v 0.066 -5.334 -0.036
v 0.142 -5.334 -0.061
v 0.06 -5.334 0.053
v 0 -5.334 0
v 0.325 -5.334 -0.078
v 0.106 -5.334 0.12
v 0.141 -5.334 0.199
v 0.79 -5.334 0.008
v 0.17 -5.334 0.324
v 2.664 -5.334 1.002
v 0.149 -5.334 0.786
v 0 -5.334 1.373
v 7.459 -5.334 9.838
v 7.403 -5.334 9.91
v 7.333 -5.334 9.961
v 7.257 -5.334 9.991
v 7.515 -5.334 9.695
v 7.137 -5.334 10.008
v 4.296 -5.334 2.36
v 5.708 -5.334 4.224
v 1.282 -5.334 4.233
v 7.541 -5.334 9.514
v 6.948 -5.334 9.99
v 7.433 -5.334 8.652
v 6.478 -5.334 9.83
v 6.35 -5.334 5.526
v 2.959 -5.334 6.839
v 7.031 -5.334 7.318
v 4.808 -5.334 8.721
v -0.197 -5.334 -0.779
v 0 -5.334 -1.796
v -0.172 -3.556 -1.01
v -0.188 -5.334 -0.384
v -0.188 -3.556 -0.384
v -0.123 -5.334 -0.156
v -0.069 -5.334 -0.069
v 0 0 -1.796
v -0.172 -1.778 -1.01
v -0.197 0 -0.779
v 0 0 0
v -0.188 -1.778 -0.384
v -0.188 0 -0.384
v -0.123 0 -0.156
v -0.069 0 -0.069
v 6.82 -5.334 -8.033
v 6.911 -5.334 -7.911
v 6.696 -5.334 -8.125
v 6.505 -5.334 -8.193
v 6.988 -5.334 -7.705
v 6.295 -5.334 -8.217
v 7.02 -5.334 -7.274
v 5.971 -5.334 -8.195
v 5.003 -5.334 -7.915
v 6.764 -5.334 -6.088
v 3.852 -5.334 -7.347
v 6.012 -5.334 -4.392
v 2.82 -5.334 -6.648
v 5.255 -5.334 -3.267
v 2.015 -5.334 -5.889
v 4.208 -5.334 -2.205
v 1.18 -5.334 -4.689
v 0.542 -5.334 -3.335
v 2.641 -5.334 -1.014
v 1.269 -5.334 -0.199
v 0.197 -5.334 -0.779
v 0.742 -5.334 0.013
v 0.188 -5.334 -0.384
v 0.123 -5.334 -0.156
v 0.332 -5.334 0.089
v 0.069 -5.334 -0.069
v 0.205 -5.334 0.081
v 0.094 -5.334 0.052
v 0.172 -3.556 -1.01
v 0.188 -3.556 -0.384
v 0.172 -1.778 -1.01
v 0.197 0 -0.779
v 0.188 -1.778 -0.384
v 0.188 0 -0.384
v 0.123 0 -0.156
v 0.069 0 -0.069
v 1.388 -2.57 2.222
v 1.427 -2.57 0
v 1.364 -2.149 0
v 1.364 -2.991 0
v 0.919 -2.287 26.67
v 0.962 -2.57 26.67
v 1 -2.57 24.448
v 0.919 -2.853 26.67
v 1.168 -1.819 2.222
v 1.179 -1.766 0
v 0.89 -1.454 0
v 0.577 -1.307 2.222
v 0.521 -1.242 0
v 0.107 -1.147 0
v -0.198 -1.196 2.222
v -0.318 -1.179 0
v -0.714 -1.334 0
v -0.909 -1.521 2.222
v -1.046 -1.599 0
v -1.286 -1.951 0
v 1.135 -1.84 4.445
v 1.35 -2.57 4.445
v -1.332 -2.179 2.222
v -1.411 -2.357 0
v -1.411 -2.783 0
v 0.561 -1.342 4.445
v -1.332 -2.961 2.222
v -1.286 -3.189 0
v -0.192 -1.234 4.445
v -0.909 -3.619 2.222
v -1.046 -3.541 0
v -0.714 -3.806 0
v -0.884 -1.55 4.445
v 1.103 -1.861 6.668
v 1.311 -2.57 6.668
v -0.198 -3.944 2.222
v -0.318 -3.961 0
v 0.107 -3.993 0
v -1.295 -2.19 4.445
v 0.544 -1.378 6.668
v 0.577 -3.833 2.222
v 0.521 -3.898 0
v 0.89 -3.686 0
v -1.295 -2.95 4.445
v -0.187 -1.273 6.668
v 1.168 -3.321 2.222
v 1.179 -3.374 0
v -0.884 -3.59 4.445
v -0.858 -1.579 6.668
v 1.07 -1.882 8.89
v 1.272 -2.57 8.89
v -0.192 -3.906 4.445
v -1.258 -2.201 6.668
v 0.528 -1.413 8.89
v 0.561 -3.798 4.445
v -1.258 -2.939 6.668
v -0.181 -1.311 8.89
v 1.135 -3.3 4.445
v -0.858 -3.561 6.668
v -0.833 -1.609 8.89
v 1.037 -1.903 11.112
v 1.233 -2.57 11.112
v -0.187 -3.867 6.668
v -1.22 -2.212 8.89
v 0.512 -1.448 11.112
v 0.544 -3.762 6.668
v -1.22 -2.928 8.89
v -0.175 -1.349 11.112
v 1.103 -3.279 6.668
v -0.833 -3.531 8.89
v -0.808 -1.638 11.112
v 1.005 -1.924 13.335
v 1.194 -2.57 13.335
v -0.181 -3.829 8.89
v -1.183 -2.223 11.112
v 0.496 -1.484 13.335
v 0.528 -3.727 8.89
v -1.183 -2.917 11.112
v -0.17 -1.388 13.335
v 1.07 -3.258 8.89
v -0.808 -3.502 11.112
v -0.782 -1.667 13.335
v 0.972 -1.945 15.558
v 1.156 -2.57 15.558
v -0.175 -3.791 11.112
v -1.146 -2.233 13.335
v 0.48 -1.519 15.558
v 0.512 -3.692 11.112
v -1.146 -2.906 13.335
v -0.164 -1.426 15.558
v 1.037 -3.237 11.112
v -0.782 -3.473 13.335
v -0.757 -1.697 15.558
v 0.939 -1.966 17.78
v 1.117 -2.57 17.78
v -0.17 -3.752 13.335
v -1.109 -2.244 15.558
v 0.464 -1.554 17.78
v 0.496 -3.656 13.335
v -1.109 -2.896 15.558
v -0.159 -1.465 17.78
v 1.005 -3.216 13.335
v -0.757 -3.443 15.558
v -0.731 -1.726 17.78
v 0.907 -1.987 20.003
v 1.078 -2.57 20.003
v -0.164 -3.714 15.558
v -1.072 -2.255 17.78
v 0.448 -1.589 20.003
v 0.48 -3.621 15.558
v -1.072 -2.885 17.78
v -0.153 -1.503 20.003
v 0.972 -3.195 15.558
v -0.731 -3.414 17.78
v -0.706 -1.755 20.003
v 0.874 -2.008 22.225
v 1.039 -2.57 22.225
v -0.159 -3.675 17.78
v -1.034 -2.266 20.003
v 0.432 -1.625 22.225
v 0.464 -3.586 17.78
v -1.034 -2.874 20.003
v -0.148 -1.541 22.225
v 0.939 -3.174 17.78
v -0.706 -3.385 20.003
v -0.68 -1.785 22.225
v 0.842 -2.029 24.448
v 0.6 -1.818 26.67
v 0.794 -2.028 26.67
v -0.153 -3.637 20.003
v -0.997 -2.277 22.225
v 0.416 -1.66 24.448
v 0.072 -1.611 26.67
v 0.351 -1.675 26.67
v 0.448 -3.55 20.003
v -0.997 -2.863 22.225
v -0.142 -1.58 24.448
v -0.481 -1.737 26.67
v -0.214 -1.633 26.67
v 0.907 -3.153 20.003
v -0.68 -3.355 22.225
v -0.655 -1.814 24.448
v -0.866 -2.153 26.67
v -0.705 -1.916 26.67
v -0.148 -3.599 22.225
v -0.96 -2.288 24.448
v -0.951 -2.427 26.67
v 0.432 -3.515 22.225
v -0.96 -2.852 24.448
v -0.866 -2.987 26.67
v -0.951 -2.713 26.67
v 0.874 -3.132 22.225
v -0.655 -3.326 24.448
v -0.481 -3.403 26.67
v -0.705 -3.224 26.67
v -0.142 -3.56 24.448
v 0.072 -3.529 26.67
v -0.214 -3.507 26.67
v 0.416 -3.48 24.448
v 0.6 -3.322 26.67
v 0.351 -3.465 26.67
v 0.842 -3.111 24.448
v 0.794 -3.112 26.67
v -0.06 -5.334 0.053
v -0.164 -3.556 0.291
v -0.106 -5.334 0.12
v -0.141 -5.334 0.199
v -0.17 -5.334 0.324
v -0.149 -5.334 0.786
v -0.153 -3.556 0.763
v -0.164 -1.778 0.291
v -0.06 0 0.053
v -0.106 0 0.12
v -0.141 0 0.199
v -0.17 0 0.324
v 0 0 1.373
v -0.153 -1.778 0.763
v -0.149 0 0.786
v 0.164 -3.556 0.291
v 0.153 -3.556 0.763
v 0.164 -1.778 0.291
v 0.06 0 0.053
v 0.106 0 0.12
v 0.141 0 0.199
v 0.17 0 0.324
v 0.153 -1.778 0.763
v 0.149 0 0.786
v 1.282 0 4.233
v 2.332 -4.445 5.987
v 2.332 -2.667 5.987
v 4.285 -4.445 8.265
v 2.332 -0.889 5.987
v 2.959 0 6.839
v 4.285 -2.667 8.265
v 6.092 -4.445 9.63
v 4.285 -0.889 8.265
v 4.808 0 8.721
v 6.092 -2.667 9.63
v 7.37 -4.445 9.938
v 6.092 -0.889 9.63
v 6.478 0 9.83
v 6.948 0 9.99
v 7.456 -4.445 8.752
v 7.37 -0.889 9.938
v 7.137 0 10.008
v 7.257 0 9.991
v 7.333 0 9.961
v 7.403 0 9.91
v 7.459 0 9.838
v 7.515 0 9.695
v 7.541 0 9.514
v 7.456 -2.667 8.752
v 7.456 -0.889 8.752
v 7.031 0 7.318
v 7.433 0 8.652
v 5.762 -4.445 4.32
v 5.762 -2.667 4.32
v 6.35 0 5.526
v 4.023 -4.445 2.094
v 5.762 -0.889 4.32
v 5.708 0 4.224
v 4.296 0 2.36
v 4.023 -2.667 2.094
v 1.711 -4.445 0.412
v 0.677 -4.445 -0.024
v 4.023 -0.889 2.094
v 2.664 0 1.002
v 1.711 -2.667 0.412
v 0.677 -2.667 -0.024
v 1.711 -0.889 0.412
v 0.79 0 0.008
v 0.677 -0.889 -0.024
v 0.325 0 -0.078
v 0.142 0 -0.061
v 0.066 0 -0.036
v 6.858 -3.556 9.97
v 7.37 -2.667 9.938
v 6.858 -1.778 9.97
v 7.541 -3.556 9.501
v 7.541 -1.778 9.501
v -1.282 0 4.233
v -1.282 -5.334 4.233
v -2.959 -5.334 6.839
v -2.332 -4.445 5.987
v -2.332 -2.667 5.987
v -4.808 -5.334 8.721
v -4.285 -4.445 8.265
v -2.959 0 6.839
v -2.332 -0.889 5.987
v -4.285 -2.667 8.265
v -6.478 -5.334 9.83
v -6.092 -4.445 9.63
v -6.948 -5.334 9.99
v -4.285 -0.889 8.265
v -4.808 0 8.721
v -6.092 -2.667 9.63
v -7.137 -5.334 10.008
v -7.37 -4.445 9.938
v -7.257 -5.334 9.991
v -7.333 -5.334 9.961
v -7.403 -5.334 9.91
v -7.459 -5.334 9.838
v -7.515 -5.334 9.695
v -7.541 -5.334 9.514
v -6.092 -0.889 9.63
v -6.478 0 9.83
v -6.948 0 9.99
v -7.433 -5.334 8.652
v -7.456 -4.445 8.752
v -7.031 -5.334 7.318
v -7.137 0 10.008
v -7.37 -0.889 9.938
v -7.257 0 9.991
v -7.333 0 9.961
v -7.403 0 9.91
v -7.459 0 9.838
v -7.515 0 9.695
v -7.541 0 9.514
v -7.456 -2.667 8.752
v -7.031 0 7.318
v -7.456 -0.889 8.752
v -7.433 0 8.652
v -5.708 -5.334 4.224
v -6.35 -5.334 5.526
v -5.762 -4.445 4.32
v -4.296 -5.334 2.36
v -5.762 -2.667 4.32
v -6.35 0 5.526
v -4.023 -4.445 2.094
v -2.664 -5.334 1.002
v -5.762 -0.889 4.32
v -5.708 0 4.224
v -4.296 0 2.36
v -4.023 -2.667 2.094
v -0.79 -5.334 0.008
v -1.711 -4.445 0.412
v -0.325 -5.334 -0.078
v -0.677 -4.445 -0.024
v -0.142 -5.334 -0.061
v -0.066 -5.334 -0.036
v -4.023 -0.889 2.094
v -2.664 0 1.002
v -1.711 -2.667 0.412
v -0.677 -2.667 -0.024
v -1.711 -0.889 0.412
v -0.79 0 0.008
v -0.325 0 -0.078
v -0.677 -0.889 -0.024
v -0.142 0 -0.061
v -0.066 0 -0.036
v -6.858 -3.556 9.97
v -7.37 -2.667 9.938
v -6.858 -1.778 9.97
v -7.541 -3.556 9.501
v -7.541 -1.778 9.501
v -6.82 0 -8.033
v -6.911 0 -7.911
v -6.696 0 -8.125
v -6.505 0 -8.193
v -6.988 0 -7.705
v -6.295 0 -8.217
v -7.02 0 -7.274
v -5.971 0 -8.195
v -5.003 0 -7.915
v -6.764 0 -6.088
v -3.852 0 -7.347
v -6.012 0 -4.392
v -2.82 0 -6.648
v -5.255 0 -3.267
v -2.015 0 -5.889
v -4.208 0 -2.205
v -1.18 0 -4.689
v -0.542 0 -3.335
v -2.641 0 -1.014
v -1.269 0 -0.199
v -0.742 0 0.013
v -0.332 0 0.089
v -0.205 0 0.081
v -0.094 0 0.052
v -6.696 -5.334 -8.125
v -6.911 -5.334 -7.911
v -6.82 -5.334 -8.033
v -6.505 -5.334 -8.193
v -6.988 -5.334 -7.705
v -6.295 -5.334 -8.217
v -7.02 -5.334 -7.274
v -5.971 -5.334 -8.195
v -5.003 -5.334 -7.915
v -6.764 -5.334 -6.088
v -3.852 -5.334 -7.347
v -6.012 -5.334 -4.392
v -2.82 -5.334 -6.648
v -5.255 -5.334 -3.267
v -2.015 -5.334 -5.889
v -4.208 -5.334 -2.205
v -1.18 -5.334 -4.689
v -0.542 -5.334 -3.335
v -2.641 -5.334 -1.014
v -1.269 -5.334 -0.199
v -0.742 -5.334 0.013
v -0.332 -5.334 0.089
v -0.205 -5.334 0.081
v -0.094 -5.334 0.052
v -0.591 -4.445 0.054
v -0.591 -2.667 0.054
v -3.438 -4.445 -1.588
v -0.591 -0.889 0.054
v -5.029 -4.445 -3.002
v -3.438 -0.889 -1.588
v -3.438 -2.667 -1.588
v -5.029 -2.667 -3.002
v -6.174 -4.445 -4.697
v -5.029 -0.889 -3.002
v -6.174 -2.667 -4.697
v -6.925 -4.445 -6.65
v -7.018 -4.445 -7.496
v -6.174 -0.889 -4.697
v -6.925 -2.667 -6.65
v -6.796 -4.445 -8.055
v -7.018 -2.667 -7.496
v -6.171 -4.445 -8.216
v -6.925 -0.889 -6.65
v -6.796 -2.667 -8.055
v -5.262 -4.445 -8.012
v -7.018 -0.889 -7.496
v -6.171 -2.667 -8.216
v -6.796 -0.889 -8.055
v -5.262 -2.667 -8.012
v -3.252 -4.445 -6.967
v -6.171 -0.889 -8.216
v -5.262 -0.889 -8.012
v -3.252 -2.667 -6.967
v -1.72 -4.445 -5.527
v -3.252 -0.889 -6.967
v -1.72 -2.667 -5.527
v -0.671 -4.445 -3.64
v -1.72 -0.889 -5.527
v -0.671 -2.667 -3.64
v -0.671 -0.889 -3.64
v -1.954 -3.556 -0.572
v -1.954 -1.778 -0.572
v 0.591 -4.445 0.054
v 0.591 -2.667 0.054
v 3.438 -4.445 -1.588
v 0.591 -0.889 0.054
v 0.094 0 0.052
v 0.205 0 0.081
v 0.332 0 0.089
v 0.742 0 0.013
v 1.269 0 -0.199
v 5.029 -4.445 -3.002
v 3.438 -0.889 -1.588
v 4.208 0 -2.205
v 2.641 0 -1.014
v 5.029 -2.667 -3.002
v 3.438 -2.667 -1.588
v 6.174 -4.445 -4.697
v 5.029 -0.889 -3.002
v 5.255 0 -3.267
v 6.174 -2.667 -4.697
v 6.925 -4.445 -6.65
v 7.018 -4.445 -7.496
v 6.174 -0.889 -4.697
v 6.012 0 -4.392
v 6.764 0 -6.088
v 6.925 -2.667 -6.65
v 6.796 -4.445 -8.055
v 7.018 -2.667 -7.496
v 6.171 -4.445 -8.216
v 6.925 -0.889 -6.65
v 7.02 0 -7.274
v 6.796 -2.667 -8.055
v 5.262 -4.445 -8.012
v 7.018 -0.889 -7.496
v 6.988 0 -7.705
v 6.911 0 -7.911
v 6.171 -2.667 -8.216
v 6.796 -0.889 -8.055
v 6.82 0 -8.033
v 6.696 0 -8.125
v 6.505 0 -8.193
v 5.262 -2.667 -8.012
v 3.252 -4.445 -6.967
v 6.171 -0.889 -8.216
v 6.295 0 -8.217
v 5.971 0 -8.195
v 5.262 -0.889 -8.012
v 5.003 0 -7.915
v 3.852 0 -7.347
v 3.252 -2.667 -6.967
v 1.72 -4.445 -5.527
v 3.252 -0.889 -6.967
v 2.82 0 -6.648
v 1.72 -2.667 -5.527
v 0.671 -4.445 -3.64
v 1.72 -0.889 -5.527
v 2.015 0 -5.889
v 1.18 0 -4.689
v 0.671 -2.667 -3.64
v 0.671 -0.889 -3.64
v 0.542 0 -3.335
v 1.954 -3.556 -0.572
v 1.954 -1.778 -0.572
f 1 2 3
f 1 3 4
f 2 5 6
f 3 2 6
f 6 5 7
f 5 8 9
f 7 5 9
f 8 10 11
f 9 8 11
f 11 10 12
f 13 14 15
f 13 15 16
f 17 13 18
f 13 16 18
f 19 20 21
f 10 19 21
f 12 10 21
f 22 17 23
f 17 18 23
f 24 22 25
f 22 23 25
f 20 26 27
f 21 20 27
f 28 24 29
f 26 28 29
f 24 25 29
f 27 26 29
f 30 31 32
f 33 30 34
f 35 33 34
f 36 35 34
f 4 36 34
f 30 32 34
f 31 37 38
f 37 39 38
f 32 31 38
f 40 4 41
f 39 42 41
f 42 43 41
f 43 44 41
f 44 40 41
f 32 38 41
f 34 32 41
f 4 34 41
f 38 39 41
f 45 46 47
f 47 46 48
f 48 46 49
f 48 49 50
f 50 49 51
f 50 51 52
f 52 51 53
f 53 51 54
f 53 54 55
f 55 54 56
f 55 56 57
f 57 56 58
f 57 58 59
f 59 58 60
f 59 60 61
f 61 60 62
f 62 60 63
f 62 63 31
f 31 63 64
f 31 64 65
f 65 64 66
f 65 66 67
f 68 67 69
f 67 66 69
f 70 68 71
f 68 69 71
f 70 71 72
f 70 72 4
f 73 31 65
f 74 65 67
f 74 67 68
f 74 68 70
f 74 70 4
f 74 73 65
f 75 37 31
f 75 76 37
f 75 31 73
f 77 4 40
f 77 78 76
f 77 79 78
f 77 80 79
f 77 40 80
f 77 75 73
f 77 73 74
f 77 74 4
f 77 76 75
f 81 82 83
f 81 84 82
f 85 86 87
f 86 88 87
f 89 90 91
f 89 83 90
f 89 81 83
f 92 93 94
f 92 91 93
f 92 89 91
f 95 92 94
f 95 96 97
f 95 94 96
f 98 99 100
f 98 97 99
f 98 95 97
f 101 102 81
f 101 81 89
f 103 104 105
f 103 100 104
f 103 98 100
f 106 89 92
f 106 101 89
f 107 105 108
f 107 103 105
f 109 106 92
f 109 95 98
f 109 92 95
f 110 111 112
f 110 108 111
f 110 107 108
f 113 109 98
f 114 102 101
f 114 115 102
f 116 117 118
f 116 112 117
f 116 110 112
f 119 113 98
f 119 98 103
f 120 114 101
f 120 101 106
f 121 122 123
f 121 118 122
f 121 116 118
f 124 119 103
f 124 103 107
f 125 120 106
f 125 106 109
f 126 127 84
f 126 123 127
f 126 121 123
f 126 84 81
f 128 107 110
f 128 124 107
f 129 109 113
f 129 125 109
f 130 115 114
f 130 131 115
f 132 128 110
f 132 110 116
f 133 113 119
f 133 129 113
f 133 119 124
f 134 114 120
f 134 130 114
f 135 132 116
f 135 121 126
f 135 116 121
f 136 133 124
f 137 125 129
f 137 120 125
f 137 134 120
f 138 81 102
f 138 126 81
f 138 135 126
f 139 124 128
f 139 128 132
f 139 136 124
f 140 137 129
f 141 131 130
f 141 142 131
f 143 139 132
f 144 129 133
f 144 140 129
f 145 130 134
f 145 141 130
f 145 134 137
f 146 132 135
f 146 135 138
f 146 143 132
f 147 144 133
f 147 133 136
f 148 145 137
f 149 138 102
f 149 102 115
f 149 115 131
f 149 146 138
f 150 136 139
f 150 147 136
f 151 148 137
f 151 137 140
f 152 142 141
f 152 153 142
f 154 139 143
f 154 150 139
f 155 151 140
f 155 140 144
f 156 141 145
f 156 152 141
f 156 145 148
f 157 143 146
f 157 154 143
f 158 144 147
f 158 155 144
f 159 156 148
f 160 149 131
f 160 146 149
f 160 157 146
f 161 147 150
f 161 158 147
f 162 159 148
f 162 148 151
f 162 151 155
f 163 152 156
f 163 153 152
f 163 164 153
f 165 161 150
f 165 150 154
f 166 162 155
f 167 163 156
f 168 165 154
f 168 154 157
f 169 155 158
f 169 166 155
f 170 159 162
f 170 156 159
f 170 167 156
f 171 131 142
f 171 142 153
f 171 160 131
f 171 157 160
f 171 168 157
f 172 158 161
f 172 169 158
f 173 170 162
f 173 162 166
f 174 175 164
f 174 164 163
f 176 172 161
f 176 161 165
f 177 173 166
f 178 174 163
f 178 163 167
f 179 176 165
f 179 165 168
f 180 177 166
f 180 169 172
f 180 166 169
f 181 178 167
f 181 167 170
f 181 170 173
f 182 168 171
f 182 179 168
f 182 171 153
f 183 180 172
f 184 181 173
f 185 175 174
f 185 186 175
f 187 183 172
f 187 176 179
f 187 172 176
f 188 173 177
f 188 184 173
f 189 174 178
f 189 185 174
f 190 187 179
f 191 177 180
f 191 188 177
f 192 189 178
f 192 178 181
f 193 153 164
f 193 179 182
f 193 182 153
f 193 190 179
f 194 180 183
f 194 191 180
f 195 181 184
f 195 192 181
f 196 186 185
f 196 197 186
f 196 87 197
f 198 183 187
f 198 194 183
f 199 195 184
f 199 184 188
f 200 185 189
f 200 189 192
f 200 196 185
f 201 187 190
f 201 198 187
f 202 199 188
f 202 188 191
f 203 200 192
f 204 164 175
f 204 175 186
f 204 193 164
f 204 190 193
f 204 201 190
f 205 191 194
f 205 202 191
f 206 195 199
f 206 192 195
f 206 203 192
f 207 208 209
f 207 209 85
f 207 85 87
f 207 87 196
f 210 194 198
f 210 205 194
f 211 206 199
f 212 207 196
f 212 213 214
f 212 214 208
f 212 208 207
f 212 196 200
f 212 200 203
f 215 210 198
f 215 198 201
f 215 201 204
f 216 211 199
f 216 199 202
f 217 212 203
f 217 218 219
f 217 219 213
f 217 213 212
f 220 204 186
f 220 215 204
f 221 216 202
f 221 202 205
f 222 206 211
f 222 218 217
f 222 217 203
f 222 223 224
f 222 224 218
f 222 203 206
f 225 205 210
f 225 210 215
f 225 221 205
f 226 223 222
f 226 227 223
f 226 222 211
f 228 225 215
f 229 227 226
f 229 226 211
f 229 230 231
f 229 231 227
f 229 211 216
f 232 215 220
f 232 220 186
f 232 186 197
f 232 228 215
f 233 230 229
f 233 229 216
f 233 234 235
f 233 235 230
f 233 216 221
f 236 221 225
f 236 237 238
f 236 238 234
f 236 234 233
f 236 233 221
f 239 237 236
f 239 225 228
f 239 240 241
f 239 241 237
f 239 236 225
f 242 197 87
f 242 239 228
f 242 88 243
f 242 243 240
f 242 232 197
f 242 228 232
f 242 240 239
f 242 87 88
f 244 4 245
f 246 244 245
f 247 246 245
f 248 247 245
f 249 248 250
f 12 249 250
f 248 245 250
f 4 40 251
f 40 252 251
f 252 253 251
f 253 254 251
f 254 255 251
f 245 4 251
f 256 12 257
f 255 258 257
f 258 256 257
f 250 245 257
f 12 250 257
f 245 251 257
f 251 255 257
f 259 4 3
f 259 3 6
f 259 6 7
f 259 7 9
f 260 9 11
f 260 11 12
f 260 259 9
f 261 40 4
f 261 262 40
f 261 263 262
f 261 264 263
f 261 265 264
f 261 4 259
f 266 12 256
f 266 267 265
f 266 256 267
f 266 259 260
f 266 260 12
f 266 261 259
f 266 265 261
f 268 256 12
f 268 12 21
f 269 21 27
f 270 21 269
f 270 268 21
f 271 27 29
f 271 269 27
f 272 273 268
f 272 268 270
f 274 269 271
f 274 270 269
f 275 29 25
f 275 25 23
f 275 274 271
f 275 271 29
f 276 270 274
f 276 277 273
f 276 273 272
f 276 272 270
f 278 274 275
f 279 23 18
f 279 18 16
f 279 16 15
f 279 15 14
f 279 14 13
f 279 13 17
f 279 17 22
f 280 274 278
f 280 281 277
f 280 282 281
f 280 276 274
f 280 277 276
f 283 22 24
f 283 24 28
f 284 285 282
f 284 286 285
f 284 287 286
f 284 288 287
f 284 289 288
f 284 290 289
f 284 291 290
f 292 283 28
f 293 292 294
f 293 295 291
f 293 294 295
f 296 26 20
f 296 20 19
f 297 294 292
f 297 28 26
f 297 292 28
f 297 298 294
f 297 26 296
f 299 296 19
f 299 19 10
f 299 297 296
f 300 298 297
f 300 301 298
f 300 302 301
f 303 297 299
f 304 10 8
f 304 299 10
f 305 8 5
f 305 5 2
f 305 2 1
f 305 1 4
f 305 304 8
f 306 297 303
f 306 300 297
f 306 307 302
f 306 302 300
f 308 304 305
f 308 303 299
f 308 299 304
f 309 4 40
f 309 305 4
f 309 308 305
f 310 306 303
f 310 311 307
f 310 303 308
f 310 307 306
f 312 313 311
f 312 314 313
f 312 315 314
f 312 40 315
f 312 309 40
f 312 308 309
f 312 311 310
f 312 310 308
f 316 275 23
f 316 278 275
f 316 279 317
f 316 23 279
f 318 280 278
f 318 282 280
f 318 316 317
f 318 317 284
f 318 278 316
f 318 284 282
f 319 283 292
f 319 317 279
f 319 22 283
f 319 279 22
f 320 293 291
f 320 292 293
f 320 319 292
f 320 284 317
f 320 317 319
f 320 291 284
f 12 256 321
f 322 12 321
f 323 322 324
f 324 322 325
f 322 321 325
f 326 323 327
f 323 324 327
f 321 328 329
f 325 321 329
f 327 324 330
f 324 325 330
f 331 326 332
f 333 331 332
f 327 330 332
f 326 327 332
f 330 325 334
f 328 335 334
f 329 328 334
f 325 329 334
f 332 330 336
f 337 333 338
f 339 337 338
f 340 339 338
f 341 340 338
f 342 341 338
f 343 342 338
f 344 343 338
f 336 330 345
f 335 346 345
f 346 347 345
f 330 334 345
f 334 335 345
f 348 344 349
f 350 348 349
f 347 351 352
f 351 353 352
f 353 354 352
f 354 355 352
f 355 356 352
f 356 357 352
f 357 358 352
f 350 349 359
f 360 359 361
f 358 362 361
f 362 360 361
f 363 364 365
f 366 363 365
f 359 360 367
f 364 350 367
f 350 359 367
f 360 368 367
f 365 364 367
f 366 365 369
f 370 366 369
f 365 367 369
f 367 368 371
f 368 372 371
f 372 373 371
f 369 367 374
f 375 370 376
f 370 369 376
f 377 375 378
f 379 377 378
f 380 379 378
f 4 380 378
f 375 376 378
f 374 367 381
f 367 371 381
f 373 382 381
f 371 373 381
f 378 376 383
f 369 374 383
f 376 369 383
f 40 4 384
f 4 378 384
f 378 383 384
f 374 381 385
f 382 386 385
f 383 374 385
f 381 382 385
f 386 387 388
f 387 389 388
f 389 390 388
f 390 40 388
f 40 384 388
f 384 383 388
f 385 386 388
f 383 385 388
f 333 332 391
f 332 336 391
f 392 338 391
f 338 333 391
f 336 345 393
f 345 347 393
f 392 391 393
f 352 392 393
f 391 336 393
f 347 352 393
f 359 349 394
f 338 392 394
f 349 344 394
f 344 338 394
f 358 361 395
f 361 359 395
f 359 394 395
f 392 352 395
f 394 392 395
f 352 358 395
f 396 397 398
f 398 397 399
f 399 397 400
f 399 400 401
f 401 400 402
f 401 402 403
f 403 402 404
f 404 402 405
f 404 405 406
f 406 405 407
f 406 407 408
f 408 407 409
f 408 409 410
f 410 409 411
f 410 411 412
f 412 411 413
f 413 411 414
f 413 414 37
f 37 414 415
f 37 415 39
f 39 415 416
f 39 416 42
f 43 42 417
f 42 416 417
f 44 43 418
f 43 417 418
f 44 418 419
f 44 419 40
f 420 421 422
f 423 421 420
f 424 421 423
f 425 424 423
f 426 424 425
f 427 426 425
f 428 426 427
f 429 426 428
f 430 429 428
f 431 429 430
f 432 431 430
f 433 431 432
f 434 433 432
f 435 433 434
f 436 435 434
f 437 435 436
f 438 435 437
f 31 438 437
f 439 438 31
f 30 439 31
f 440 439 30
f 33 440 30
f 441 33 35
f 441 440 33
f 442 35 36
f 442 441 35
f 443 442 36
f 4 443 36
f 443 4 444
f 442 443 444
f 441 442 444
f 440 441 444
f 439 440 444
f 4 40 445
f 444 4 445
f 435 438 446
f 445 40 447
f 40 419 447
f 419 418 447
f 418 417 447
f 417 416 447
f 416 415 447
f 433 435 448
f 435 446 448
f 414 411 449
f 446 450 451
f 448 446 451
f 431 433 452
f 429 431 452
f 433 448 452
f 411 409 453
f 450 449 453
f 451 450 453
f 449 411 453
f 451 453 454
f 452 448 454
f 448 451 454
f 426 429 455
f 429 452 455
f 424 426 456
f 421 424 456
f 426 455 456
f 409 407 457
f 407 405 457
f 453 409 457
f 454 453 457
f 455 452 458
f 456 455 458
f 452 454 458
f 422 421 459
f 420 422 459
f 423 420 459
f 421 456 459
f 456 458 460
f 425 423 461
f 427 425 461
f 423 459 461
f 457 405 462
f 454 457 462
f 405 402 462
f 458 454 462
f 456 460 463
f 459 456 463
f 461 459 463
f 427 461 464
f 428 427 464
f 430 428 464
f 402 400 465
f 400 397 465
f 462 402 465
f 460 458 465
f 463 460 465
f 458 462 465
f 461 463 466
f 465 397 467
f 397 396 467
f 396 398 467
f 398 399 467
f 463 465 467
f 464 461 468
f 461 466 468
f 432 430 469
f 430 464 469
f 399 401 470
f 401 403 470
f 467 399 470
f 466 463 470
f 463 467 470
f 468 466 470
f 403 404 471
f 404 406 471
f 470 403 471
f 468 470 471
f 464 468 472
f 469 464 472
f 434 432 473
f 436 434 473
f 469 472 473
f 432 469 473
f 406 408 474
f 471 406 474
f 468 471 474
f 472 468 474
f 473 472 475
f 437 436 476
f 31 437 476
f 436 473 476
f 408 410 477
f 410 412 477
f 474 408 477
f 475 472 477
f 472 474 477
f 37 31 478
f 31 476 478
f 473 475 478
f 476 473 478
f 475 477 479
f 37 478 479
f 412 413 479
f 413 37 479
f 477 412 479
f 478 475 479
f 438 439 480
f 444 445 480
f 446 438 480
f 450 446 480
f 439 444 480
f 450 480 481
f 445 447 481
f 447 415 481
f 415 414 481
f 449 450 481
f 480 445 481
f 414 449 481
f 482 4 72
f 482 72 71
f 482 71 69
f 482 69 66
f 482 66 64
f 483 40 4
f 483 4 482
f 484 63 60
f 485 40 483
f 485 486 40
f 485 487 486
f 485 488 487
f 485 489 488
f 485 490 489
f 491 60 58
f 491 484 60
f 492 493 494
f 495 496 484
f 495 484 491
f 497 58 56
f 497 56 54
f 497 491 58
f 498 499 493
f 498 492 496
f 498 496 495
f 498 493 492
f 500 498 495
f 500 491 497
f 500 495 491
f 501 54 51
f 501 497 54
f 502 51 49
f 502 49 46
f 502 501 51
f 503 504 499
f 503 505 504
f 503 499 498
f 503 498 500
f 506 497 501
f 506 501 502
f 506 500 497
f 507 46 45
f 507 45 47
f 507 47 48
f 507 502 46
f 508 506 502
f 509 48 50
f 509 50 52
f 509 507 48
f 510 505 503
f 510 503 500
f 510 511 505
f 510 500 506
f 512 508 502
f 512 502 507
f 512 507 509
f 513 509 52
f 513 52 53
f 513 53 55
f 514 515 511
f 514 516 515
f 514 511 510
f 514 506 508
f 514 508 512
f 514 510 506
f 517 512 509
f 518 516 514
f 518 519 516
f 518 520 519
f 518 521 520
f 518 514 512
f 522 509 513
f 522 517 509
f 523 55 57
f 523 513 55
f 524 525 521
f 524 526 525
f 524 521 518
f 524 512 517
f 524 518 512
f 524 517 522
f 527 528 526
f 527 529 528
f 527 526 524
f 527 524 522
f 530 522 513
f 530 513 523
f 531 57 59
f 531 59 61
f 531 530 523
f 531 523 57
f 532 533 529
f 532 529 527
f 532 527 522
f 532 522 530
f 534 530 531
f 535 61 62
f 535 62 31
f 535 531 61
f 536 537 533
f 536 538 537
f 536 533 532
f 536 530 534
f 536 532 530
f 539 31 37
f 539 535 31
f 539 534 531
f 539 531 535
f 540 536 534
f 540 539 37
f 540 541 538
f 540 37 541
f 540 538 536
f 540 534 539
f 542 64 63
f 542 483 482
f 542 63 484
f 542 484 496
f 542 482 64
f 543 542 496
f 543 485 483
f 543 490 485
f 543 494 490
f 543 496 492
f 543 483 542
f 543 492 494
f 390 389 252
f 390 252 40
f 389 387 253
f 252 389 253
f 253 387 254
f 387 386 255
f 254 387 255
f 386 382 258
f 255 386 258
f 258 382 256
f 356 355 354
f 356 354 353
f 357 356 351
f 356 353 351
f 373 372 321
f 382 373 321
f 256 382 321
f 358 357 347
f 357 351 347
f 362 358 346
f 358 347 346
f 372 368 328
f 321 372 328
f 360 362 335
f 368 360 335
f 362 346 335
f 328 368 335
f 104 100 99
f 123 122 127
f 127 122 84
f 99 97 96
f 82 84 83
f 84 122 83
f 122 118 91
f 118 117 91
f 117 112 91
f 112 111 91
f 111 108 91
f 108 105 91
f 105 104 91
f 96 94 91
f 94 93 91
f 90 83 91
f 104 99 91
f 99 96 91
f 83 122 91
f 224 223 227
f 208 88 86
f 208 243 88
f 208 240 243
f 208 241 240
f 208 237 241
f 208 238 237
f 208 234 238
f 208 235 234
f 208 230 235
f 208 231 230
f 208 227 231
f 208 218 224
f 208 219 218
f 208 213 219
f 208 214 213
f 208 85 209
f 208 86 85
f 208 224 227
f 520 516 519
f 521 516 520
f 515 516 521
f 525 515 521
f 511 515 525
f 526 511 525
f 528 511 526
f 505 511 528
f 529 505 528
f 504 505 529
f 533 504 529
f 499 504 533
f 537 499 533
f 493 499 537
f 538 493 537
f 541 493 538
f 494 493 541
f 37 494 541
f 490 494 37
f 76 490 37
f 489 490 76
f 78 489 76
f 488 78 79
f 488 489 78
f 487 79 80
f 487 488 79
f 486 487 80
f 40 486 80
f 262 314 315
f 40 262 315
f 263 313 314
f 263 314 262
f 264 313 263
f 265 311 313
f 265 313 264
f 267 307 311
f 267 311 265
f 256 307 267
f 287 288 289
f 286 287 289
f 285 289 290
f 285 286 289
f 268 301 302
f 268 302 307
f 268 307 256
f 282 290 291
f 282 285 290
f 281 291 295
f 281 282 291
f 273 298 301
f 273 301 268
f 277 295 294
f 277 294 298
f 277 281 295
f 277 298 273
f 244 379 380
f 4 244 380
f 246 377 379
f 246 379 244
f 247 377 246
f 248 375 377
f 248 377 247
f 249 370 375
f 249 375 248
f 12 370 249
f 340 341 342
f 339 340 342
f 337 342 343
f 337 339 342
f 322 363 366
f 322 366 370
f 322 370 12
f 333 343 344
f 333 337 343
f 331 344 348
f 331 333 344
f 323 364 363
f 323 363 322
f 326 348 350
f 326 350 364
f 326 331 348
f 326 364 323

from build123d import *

# Parameters (mm, degrees)
F2_DEPTH = 5.334
F3_R     = 1.427088879
F4_DEPTH = 26.67
F4_TAPER = 1


with BuildPart() as f2:
    # F0 (on Front) → F2 (new body)
    with BuildSketch(Plane.XZ):
        with BuildLine():
            add(Edge.make_bspline(
                [(0, 1.3734232062), (-0.1891456517, 1.9682690903), (-1.3872274811, 4.6479528258), (-3.5359864877, 8.1093093668), (-8.3029516428, 11.1686804607), (-6.7154718992, 6.2014445679), (-4.9282457235, 2.1279215131), (-0.5743113943, -0.4013639182), (0, 0)],
                knots=[0.0787883503, 0.0787883503, 0.0787883503, 0.0787883503, 0.1493641404, 0.34640222, 0.4970269185, 0.6404182512, 0.8287738354, 1, 1, 1, 1], degree=3))
            add(Edge.make_bspline(
                [(0, 0), (-0.2642647953, 0.1846843972), (-0.2111556083, 0.7093580091), (0, 1.3734232062)],
                knots=[0, 0, 0, 0, 0.0787883503, 0.0787883503, 0.0787883503, 0.0787883503], degree=3))
        make_face()
    extrude(amount=F2_DEPTH)


with BuildPart() as f2b:
    # F0 (on Front) → F2, piece 2 (new body)
    with BuildSketch(Plane.XZ):
        with BuildLine():
            add(Edge.make_bspline(
                [(0, 0), (0.2642647953, 0.1846843972), (0.2111556083, 0.7093580091), (0, 1.3734232062)],
                knots=[0, 0, 0, 0, 0.0787883503, 0.0787883503, 0.0787883503, 0.0787883503], degree=3))
            add(Edge.make_bspline(
                [(0, 1.3734232062), (0.1891456517, 1.9682690903), (1.3872274811, 4.6479528258), (3.5359864877, 8.1093093668), (8.3029516428, 11.1686804607), (6.7154718992, 6.2014445679), (4.9282457235, 2.1279215131), (0.5743113943, -0.4013639182), (0, 0)],
                knots=[0.0787883503, 0.0787883503, 0.0787883503, 0.0787883503, 0.1493641404, 0.34640222, 0.4970269185, 0.6404182512, 0.8287738354, 1, 1, 1, 1], degree=3))
        make_face()
    extrude(amount=F2_DEPTH)


with BuildPart() as f2c:
    # F1 (on Front) → F2, piece 3 (new body)
    with BuildSketch(Plane.XZ):
        with BuildLine():
            add(Edge.make_bspline(
                [(0, -1.7959175247), (-0.2337398032, -0.9580135272), (-0.3070084548, -0.234345833), (0, 0)],
                knots=[0.9045673843, 0.9045673843, 0.9045673843, 0.9045673843, 1, 1, 1, 1], degree=3))
            add(Edge.make_bspline(
                [(0, 0), (-0.5336749747, 0.4073650237), (-3.976302372, -1.7841660826), (-6.1917247461, -4.0886252186), (-7.9181121338, -9.2949958308), (-2.5771520257, -6.9829206625), (-1.0584729835, -4.7452005162), (-0.1679340915, -2.3979230226), (0, -1.7959175247)],
                knots=[0, 0, 0, 0, 0.1658911929, 0.3393833044, 0.4969228956, 0.6610761119, 0.8360022986, 0.9045673843, 0.9045673843, 0.9045673843, 0.9045673843], degree=3))
        make_face()
    extrude(amount=F2_DEPTH)


with BuildPart() as f2d:
    # F1 (on Front) → F2, piece 4 (new body)
    with BuildSketch(Plane.XZ):
        with BuildLine():
            add(Edge.make_bspline(
                [(0, 0), (0.5336749747, 0.4073650237), (3.976302372, -1.7841660826), (6.1917247461, -4.0886252186), (7.9181121338, -9.2949958308), (2.5771520257, -6.9829206625), (1.0584729835, -4.7452005162), (0.1679340915, -2.3979230226), (0, -1.7959175247)],
                knots=[0, 0, 0, 0, 0.1658911929, 0.3393833044, 0.4969228956, 0.6610761119, 0.8360022986, 0.9045673843, 0.9045673843, 0.9045673843, 0.9045673843], degree=3))
            add(Edge.make_bspline(
                [(0, -1.7959175247), (0.2337398032, -0.9580135272), (0.3070084548, -0.234345833), (0, 0)],
                knots=[0.9045673843, 0.9045673843, 0.9045673843, 0.9045673843, 1, 1, 1, 1], degree=3))
        make_face()
    extrude(amount=F2_DEPTH)


with BuildPart() as f4:
    # F3 (on Top) → F4 (new body)
    with BuildSketch(Plane.XY):
        with Locations((0, -2.5699601974)):
            Circle(F3_R)
    extrude(amount=F4_DEPTH, taper=F4_TAPER)


solid = Compound([f2.part, f2b.part, f2c.part, f2d.part, f4.part])
